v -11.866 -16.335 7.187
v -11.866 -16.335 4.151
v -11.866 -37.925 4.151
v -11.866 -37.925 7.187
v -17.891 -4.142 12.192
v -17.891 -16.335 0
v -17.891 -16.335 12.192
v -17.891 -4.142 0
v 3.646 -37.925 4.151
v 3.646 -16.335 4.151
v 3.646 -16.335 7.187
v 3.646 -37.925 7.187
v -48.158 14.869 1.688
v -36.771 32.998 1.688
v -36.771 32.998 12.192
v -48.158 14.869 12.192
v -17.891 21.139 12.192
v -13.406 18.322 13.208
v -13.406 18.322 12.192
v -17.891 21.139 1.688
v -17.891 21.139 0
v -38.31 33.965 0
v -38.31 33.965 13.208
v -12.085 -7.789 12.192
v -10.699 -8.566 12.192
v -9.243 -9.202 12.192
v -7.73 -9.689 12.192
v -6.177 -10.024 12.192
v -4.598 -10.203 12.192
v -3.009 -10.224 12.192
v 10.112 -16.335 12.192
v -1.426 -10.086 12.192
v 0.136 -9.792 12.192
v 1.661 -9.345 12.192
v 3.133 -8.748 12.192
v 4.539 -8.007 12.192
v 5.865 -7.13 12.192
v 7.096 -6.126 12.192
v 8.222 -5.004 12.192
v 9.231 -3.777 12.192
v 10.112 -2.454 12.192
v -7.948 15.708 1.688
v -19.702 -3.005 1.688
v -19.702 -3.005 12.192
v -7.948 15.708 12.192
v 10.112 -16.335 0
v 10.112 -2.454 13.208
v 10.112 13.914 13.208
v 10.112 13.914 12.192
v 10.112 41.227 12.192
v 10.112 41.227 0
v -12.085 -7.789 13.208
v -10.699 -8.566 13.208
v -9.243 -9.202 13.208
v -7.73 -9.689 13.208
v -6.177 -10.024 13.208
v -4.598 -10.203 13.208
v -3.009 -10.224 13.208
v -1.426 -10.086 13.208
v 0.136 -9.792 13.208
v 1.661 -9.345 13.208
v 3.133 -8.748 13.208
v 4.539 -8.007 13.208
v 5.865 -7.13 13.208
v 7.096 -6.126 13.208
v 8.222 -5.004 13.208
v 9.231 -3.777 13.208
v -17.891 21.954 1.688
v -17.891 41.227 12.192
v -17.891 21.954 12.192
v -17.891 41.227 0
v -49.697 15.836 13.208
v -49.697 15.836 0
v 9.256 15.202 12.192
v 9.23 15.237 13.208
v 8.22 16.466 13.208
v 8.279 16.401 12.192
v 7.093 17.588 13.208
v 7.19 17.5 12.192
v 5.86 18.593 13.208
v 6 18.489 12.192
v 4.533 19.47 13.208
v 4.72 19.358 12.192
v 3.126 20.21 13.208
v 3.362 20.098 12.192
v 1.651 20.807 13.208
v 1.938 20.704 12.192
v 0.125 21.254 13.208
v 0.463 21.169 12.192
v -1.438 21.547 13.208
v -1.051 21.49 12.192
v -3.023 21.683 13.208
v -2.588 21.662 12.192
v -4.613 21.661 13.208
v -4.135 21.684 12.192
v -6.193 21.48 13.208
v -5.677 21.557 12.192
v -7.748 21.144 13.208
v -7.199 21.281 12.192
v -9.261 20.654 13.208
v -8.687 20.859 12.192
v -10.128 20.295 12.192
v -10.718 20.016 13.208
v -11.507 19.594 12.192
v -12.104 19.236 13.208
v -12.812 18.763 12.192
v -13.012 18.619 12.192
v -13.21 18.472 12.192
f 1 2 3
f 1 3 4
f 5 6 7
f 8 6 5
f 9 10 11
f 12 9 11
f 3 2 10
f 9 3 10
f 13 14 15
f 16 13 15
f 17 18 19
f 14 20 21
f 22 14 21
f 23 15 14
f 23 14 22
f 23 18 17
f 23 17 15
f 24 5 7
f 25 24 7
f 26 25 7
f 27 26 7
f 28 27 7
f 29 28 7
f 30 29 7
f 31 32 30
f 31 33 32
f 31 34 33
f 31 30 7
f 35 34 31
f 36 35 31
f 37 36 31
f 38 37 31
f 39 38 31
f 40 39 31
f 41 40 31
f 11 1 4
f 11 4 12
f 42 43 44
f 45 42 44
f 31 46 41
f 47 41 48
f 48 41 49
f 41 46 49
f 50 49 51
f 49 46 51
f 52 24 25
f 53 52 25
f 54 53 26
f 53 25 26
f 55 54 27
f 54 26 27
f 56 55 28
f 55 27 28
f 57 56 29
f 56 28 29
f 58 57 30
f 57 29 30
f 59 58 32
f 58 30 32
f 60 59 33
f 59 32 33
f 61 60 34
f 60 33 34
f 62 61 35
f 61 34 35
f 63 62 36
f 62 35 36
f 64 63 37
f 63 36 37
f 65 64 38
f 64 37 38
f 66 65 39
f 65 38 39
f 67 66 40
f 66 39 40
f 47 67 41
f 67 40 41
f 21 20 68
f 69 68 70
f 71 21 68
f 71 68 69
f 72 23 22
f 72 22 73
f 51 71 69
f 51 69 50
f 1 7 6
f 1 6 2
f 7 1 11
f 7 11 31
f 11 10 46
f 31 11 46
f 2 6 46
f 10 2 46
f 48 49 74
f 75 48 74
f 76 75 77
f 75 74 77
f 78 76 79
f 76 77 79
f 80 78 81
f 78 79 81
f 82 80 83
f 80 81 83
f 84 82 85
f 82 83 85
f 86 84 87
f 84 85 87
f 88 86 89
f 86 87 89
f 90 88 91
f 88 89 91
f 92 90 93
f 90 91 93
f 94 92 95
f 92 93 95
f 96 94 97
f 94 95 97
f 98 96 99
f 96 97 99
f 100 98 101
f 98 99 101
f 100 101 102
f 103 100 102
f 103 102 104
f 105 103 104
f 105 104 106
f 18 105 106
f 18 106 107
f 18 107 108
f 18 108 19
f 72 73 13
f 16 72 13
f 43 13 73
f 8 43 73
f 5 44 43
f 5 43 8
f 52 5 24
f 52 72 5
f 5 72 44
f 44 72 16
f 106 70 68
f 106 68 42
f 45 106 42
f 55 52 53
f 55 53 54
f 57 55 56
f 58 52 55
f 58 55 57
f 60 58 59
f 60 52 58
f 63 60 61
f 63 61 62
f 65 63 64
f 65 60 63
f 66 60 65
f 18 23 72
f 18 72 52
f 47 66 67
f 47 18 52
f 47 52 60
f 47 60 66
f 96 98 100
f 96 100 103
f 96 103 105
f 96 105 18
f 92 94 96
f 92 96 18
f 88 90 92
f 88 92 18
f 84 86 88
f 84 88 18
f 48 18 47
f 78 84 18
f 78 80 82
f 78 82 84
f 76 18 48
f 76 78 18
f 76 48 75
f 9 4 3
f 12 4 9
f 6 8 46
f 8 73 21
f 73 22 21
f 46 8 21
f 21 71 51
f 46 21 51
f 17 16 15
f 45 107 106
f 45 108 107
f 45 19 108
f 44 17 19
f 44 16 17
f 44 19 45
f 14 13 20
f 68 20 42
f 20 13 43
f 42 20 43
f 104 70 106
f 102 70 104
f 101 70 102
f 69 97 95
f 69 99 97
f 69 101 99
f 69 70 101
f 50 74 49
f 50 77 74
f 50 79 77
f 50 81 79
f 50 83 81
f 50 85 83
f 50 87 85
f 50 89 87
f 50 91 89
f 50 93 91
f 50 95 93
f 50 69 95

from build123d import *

# Parameters (mm, degrees)
F0_W     = 28.0035007745
F0_H     = 57.5627535582
F1_DEPTH = 12.192
F2_W     = 15.5119162519
F2_H     = 3.0358484946
F3_DEPTH = 21.59
F5_DEPTH = 1.016
F7_DEPTH = 13.208
F8_W     = 33.6042
F8_H     = 10.5041724799
F9_DEPTH = 22.098


with BuildPart() as f1:
    # F0 (on Top) → F1 (new body)
    with BuildSketch(Plane.XY):
        with Locations((-3.8893753663, 12.4460011721)):
            Rectangle(F0_W, F0_H)
    extrude(amount=F1_DEPTH)

    # F2 (on face) → F3 (join)
    with BuildSketch(Plane.XZ.offset(16.335375607)):
        with Locations((-4.1097527137, 5.6689756457)):
            Rectangle(F2_W, F2_H)
    extrude(amount=F3_DEPTH)

    # F4 (on face) → F5 (join)
    with BuildSketch(Plane.XY.offset(12.192)):
        with BuildLine():
            Line((10.112375021, -2.4543297905), (10.112375021, 13.9135444033))
            ThreePointArc((10.112375021, 13.9135444033), (-4.210298008, 21.68161298), (-17.8911257535, 12.8319347765))
            Line((-17.8911257535, 12.8319347765), (-17.8911257535, -1.3727201637))
            ThreePointArc((-17.8911257535, -1.3727201637), (-4.210298008, -10.2223983672), (10.112375021, -2.4543297905))
        make_face()
    extrude(amount=F5_DEPTH)

    # F6 (on face) → F7 (join)
    with BuildSketch(Plane.XY.offset(13.208)):
        with BuildLine():
            ThreePointArc((-17.8911257535, 12.8319347765), (-15.9572228314, 15.8291586852), (-13.4060875251, 18.3221569444))
            Line((-13.4060875251, 18.3221569444), (-38.3101751119, 33.9651258488))
            Line((-38.3101751119, 33.9651258488), (-49.6973358095, 15.8364158124))
            Line((-49.6973358095, 15.8364158124), (-12.0854080322, -7.7887105691))
            ThreePointArc((-12.0854080322, -7.7887105691), (-15.431258916, -4.9815711153), (-17.8911257535, -1.3727201637))
            Line((-17.8911257535, -1.3727201637), (-17.8911257535, 12.8319347765))
        make_face()
    extrude(amount=-F7_DEPTH)

    # F8 (on face) → F9 (cut)
    with BuildSketch(Plane(origin=(-6.9273860037, -11.028611566, 0), x_dir=(0.8468054721, -0.5319027096, 0), z_dir=(-0.5319027096, -0.8468054721, 0))):
        with Locations((-31.8871685294, 6.93991376)):
            Rectangle(F8_W, F8_H)
    extrude(amount=-F9_DEPTH, mode=Mode.SUBTRACT)


solid = f1.part
